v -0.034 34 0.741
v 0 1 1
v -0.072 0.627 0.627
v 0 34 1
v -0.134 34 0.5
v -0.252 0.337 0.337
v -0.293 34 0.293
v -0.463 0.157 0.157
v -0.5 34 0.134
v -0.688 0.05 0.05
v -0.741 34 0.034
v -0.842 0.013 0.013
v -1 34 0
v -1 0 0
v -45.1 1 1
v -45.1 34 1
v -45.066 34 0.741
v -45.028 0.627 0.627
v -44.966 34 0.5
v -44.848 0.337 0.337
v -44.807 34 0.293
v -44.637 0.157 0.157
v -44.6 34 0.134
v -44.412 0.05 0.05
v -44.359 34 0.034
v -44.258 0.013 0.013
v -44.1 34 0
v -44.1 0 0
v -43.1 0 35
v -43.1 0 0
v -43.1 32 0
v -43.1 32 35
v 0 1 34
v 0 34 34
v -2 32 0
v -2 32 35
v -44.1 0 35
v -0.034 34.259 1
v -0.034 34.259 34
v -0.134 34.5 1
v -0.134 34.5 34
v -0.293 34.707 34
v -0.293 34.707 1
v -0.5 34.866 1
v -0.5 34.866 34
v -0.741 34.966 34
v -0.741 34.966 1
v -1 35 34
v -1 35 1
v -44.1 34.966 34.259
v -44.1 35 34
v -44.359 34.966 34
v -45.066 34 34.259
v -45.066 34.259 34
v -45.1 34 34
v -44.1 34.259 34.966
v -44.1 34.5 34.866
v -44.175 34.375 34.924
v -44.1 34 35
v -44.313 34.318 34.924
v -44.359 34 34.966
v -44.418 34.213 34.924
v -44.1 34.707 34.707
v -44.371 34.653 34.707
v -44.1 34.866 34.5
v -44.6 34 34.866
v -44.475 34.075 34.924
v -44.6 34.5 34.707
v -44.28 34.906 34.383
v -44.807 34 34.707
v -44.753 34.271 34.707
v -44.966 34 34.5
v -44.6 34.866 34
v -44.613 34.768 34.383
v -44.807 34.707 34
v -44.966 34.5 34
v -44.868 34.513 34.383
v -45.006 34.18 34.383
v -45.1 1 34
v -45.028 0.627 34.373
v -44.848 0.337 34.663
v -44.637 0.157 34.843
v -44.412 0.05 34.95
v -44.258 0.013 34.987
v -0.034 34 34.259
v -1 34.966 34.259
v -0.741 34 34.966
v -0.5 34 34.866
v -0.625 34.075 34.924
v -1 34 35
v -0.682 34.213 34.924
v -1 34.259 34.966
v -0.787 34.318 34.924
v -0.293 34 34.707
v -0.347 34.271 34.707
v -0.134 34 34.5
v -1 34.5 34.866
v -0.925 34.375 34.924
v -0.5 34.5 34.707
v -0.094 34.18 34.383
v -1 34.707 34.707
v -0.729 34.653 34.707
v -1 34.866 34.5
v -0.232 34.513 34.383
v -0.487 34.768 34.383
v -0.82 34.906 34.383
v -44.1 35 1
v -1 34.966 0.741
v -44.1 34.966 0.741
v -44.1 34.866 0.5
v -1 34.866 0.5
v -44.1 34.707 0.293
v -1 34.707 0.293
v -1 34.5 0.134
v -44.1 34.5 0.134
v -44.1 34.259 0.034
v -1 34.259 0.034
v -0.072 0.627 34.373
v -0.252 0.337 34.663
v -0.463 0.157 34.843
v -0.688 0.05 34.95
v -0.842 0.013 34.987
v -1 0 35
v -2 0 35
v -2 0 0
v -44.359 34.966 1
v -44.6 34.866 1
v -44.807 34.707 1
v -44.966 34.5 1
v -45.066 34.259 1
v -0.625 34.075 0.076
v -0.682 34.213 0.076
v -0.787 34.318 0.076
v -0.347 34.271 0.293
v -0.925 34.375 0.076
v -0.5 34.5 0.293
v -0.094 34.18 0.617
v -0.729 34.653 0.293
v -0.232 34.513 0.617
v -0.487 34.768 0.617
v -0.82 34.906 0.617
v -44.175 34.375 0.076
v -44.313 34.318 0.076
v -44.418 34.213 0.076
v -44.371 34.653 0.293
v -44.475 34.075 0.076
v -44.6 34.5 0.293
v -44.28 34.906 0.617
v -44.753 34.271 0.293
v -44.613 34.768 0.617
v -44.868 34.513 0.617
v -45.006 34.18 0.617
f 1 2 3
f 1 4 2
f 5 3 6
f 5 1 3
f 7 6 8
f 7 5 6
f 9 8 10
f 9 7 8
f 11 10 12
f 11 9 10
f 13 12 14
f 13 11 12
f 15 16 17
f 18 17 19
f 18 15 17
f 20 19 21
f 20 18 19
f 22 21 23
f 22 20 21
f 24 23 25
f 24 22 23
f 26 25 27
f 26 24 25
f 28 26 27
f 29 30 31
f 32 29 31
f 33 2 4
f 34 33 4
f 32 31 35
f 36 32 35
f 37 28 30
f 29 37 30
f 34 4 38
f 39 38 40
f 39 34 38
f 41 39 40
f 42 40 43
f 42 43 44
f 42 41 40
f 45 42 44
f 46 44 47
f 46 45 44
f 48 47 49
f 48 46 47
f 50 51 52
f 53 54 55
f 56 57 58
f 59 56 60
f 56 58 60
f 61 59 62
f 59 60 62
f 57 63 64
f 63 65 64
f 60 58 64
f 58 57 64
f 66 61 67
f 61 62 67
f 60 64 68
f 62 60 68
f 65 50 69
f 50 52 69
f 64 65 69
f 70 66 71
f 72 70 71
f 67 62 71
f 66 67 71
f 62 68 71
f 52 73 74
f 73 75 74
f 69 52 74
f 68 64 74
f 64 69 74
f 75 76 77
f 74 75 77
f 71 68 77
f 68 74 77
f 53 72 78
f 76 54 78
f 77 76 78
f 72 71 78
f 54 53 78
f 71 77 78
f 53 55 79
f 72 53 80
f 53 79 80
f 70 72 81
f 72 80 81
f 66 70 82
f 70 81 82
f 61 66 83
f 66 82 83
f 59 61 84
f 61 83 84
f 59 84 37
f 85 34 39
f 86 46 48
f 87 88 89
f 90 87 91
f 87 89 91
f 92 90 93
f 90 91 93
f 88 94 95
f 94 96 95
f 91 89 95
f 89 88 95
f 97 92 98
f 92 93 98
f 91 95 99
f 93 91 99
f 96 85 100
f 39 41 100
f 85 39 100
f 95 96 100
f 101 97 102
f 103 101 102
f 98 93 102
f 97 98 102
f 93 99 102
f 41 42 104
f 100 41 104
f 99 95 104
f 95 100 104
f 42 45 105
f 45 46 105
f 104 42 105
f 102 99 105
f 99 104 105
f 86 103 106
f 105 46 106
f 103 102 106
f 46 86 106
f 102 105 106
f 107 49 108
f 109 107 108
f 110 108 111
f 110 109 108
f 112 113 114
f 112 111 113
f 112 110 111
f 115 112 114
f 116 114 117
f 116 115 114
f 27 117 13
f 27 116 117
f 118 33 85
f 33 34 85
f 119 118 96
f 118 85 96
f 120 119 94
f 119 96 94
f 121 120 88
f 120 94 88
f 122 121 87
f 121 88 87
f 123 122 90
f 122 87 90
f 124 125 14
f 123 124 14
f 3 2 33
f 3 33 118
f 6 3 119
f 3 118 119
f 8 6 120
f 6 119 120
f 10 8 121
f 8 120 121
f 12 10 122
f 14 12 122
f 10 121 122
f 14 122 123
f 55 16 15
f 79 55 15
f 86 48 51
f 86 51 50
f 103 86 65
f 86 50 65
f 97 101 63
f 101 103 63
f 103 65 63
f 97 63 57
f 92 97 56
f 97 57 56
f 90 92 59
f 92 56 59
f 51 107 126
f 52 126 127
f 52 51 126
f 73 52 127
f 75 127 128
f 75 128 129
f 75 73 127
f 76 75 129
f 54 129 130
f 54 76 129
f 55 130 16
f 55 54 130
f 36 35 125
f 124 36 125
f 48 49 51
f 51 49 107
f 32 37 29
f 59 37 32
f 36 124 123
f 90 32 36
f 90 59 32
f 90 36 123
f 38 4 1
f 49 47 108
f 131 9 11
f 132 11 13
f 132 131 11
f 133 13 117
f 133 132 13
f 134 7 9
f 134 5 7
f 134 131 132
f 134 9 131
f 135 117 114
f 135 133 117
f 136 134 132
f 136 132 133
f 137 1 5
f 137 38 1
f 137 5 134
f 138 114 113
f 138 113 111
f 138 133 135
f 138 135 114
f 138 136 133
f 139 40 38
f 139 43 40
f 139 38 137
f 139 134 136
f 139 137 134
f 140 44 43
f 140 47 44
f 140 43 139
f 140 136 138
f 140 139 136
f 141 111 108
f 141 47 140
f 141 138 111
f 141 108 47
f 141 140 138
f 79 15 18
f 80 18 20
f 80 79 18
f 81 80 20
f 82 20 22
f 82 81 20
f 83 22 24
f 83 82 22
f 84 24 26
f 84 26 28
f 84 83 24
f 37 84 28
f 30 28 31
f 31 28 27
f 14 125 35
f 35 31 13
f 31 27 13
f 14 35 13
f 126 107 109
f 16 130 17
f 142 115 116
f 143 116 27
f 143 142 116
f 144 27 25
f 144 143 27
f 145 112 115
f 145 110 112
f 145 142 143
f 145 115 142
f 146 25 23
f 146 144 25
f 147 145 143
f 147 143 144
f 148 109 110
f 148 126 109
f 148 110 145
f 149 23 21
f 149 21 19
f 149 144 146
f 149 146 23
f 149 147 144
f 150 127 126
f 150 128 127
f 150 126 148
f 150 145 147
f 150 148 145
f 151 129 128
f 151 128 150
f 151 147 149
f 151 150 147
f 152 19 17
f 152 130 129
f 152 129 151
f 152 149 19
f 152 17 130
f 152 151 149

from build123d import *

# Parameters (mm, degrees)
PAD_DEPTH = 35
FILLET_R  = 1


with BuildPart() as part:
    # Sketch → Pad (new body)
    with BuildSketch(Plane.XY):
        Polygon((0, 0), (0, 35), (-45.1, 35), (-45.1, 0), (-43.1, 0), (-43.1, 32), (-2, 32), (-2, 0), align=None)
    extrude(amount=PAD_DEPTH)

    # Fillet
    fillet_edges = [part.edges().sort_by_distance(p)[0] for p in [
        (0, 0, 17.5),
        (0, 35, 17.5),
        (0, 17.5, 0),
        (0, 17.5, 35),
        (-45.1, 35, 17.5),
        (-22.55, 35, 0),
        (-22.55, 35, 35),
        (-45.1, 0, 17.5),
        (-45.1, 17.5, 0),
        (-45.1, 17.5, 35),
    ]]
    fillet(fillet_edges, radius=FILLET_R)


solid = part.part
